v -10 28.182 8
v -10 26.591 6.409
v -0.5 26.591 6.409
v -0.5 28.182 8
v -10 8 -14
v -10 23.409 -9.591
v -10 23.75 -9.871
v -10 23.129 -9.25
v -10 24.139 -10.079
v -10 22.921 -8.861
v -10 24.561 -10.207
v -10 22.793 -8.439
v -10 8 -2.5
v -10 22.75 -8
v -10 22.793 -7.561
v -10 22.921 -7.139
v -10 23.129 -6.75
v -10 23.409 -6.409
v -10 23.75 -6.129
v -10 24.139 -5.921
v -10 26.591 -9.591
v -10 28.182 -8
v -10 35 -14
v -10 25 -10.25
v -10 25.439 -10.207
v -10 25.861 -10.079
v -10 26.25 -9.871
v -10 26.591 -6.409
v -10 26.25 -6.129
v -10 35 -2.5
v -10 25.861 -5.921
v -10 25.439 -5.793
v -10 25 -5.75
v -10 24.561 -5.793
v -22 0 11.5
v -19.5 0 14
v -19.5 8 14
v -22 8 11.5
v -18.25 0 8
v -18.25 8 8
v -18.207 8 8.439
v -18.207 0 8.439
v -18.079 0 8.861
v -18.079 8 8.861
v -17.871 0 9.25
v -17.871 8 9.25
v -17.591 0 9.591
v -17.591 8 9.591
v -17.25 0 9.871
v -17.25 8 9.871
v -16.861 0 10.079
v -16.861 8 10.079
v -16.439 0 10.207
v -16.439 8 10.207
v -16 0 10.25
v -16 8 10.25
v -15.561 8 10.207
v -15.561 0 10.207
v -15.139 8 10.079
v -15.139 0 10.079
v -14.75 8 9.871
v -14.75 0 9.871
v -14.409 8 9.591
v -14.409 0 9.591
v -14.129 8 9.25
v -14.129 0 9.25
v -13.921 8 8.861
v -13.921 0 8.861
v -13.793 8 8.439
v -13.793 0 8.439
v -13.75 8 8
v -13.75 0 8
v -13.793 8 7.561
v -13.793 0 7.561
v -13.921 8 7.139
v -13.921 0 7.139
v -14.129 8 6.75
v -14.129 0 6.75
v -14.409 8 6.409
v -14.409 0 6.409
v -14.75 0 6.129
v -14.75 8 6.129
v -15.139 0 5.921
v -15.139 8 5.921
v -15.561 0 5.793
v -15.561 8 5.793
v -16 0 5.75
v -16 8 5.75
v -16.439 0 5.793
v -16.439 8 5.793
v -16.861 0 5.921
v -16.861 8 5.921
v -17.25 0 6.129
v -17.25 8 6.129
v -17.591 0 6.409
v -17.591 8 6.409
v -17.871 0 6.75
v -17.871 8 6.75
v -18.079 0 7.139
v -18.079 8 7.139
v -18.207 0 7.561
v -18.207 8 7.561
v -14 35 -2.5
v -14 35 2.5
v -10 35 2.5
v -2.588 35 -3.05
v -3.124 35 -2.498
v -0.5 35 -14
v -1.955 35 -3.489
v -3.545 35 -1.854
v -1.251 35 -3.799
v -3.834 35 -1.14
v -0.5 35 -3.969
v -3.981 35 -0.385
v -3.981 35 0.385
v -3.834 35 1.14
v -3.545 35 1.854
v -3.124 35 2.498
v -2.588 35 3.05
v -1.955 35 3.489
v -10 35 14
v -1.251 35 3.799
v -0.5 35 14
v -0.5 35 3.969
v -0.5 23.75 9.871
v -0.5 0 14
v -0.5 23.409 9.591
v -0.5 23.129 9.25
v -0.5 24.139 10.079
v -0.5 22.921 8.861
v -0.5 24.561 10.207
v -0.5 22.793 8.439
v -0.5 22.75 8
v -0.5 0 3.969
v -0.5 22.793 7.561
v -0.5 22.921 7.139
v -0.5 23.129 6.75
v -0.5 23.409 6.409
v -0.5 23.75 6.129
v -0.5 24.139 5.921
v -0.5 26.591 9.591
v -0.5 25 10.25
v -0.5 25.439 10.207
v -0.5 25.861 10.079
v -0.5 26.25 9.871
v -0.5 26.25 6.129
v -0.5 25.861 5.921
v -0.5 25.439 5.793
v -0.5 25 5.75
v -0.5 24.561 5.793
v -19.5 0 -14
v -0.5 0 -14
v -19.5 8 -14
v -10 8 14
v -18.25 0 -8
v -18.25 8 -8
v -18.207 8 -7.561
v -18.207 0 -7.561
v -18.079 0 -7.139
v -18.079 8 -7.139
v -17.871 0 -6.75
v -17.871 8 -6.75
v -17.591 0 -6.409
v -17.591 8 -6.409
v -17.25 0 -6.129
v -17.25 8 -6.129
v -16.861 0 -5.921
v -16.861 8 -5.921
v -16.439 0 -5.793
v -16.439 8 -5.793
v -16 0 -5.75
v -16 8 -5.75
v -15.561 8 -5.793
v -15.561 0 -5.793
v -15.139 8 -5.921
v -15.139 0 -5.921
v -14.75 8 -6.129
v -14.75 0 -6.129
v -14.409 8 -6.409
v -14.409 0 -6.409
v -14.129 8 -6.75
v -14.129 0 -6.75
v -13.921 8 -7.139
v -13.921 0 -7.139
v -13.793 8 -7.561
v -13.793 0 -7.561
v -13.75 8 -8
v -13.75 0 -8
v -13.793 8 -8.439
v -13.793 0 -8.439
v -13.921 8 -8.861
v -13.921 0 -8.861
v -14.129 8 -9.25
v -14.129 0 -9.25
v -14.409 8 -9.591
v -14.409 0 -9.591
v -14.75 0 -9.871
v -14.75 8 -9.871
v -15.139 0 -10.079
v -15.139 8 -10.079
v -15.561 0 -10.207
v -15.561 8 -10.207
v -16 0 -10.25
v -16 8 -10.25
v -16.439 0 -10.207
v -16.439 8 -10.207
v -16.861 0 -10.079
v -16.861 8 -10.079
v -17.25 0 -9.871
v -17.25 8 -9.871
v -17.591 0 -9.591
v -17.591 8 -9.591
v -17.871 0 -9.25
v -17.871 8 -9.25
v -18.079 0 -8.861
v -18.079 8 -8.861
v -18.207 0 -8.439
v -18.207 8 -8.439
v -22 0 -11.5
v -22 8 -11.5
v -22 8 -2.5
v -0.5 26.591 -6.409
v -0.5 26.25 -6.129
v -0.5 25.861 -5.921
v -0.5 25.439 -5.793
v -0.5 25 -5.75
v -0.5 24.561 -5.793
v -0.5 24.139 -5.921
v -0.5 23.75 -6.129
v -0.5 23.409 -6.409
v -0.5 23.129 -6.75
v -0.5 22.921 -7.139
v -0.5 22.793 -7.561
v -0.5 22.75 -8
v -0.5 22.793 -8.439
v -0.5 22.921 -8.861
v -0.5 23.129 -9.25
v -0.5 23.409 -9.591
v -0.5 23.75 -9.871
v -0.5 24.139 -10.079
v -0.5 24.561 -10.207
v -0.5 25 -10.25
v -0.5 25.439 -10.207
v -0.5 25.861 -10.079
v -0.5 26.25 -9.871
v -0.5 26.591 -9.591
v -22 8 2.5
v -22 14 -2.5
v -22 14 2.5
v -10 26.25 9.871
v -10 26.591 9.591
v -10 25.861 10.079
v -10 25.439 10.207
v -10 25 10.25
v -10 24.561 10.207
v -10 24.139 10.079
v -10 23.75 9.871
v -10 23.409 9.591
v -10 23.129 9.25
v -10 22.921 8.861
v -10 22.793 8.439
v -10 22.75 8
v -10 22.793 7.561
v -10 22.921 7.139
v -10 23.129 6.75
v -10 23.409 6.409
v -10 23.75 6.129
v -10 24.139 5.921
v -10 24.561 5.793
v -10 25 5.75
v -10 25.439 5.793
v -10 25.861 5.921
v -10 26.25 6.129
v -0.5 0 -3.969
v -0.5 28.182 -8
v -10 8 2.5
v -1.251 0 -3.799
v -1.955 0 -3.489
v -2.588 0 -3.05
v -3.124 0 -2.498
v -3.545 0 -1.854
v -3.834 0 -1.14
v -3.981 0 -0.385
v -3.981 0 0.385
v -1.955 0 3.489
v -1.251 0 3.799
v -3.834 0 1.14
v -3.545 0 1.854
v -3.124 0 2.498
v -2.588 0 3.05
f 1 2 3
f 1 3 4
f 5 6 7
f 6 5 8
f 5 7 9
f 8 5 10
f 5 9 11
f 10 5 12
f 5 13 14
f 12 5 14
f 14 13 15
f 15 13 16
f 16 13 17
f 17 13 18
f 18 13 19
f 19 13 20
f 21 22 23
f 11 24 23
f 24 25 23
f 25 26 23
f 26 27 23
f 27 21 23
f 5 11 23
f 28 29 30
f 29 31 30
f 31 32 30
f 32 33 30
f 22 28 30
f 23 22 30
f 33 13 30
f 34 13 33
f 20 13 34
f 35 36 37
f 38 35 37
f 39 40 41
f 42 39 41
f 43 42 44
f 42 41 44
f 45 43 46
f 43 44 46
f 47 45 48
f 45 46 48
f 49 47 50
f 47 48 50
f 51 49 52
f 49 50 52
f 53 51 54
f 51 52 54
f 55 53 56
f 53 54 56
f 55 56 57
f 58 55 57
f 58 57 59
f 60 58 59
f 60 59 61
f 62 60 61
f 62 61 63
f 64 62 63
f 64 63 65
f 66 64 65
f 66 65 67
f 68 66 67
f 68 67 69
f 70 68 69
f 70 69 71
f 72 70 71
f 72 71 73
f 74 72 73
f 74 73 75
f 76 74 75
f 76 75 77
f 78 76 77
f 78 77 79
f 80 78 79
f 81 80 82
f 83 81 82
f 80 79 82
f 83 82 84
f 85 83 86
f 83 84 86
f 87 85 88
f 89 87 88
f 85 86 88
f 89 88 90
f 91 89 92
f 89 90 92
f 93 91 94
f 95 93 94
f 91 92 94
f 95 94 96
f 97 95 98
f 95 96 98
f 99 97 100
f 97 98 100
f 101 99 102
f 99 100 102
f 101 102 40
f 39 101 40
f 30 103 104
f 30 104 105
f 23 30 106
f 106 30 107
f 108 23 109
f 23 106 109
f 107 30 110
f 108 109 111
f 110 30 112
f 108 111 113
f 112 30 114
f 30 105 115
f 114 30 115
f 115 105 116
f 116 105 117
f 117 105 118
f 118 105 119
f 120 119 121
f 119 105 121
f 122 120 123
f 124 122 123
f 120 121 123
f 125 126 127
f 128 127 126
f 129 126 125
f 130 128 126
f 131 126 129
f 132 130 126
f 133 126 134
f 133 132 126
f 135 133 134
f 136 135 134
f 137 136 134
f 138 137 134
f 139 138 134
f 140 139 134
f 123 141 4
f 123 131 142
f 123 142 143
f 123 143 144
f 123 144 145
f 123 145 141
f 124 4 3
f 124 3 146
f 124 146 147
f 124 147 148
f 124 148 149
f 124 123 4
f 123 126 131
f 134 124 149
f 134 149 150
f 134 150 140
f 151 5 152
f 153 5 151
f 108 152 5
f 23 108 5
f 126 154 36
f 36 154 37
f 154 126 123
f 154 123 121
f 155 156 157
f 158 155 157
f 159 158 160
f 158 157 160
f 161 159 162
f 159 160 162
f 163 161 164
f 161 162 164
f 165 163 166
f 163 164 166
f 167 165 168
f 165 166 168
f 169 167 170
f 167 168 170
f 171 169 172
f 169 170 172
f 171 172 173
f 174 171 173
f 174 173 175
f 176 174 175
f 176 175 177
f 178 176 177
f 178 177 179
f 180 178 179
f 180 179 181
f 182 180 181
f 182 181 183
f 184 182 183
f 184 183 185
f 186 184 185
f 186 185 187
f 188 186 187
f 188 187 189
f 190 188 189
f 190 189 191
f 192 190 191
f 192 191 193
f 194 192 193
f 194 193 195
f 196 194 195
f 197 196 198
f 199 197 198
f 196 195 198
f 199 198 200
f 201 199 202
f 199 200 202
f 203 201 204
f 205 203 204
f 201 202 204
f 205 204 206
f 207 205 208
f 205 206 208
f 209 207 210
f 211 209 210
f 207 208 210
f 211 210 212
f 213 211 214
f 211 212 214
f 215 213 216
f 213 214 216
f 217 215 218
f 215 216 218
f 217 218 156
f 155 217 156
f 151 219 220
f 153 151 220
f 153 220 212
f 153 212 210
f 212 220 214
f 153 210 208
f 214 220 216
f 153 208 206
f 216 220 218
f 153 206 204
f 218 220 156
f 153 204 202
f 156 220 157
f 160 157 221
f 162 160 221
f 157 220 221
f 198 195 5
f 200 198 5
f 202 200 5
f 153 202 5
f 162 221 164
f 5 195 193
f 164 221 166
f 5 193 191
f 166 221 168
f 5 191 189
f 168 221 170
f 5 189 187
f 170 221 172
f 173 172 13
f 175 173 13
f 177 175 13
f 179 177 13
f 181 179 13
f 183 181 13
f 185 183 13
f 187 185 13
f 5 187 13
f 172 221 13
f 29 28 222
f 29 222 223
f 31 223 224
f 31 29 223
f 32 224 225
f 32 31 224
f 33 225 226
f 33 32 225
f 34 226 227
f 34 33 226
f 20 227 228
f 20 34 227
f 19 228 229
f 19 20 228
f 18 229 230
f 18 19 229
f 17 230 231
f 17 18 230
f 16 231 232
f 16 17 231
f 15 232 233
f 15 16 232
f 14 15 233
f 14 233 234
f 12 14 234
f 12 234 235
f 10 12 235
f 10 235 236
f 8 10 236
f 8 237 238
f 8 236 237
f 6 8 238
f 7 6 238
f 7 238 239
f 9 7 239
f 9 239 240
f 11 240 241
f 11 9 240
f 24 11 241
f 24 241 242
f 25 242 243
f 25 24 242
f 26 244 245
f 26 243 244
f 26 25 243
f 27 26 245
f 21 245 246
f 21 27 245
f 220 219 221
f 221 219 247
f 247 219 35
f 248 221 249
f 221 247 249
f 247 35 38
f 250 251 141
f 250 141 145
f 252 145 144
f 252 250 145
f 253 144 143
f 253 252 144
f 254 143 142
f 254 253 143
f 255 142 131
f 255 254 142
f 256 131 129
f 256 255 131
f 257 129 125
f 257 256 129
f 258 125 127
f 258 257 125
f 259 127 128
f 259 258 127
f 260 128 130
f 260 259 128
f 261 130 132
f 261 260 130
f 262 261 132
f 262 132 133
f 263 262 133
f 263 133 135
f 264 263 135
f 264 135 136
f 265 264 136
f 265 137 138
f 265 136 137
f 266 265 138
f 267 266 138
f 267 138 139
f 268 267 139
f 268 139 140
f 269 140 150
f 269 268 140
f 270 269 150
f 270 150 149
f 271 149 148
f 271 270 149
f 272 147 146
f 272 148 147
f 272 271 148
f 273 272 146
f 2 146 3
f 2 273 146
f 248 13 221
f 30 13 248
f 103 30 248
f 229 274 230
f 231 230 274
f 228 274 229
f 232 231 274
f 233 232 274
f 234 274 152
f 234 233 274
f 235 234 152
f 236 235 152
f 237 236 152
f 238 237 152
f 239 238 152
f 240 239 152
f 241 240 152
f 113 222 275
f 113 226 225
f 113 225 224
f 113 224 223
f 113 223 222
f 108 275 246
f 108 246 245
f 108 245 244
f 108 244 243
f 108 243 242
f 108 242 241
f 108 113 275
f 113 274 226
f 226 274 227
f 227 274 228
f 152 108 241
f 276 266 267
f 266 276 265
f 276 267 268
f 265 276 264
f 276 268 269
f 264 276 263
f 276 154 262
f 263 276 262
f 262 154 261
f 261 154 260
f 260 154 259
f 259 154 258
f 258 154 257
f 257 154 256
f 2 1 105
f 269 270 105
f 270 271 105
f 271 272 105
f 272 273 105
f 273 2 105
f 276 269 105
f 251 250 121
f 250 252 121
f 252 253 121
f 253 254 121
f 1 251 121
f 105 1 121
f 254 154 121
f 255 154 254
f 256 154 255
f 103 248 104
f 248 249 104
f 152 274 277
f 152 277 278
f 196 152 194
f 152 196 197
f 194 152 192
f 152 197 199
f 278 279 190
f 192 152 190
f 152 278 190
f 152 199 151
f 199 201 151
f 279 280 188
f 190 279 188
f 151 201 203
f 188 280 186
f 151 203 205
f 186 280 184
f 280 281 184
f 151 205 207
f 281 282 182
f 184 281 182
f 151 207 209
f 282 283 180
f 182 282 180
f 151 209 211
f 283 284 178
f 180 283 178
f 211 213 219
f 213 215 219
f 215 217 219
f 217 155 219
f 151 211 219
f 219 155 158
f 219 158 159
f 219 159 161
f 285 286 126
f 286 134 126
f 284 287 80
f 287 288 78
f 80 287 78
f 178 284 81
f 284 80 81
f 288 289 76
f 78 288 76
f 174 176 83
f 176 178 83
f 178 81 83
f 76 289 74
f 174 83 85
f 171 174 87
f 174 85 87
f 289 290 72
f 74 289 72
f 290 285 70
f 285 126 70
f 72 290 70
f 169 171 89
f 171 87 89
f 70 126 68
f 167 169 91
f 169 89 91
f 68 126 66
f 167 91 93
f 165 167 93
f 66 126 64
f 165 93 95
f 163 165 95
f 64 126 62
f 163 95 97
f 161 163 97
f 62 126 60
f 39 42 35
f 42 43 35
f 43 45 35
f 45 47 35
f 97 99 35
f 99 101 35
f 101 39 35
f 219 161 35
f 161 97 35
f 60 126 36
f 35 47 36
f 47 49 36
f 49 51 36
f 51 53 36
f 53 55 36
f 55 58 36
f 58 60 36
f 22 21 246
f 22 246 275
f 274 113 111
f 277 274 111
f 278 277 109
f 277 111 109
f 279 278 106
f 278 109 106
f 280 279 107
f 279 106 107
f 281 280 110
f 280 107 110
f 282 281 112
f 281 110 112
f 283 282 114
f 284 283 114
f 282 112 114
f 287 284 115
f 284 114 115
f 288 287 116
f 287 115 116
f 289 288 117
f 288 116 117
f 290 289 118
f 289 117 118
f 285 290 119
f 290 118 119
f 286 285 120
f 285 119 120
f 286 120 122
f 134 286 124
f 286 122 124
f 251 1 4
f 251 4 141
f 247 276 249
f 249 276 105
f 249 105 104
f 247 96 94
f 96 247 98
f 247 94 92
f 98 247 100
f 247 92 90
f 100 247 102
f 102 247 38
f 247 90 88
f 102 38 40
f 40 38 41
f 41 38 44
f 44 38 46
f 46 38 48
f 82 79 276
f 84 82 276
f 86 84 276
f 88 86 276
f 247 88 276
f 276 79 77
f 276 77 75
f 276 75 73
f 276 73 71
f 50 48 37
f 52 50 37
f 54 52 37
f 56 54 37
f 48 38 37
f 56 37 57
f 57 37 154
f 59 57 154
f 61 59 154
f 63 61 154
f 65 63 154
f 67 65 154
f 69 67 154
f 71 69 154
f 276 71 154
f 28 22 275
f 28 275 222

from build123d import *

# Parameters (mm, degrees)
BOSS_EXTRUDE1_DEPTH = 14
SKETCH2_R           = 4
CUT_EXTRUDE1_DEPTH  = 44.646305686
SKETCH3_W           = 0.5
SKETCH3_H           = 28
CUT_EXTRUDE2_DEPTH  = 44.646305686
SKETCH4_R           = 2.25
CUT_EXTRUDE3_DEPTH  = 38.536648758
CUT_EXTRUDE4_DEPTH  = 40.56008089
CHAMFER1_SIZE       = 2.5
BOSS_EXTRUDE2_DEPTH = 2.5


with BuildPart() as part:
    # Sketch1 → Boss-Extrude1 (new, symmetric)
    with BuildSketch(Plane.XY):
        Polygon((0, 0), (-22, 0), (-22, 8), (-10, 8), (-10, 35), (0, 35), align=None)
    extrude(amount=BOSS_EXTRUDE1_DEPTH, both=True)

    # Sketch2 → Cut-Extrude1 (cut, through all)
    with BuildSketch(Plane(origin=(0, 35, 0), x_dir=(1, 0, 0), z_dir=(0, 1, 0))):
        Circle(SKETCH2_R)
    extrude(amount=-CUT_EXTRUDE1_DEPTH, mode=Mode.SUBTRACT)

    # Sketch3 → Cut-Extrude2 (cut, through all)
    with BuildSketch(Plane(origin=(0, 35, 0), x_dir=(1, 0, 0), z_dir=(0, 1, 0))):
        with Locations((-0.25, 0)):
            Rectangle(SKETCH3_W, SKETCH3_H)
    extrude(amount=-CUT_EXTRUDE2_DEPTH, mode=Mode.SUBTRACT)

    # Sketch4 → Cut-Extrude3 (cut, through all)
    with BuildSketch(Plane(origin=(0, 8, 0), x_dir=(1, 0, 0), z_dir=(0, 1, 0))):
        with Locations(Location((-16, 8, 0), (0, 0, 180))):
            Circle(SKETCH4_R)
        with Locations(Location((-16, -8, 0), (0, 0, 180))):
            Circle(SKETCH4_R)
    extrude(amount=-CUT_EXTRUDE3_DEPTH, mode=Mode.SUBTRACT)

    # Sketch5 → Cut-Extrude4 (cut, through all)
    with BuildSketch(Plane.ZY.offset(10)):
        with BuildLine():
            Line((6.409009742, 26.590990258), (8, 28.181980515))
            Line((8, 28.181980515), (9.590990258, 26.590990258))
            ThreePointArc((9.590990258, 26.590990258), (8, 22.75), (6.409009742, 26.590990258))
        make_face()
        with BuildLine():
            Line((-9.590990258, 26.590990258), (-8, 28.181980515))
            Line((-8, 28.181980515), (-6.409009742, 26.590990258))
            ThreePointArc((-6.409009742, 26.590990258), (-8, 22.75), (-9.590990258, 26.590990258))
        make_face()
    extrude(amount=-CUT_EXTRUDE4_DEPTH, mode=Mode.SUBTRACT)

    # Chamfer1
    chamfer1_edges = [part.edges().sort_by_distance(p)[0] for p in [
        (-22, 4, 14),
        (-22, 4, -14),
    ]]
    chamfer(chamfer1_edges, length=CHAMFER1_SIZE)

    # Sketch6 → Boss-Extrude2 (add, symmetric)
    with BuildSketch(Plane.XY):
        Polygon((-22, 8), (-22, 14), (-14, 35), (-10, 35), (-10, 8), align=None)
    extrude(amount=BOSS_EXTRUDE2_DEPTH, both=True)


solid = part.part
